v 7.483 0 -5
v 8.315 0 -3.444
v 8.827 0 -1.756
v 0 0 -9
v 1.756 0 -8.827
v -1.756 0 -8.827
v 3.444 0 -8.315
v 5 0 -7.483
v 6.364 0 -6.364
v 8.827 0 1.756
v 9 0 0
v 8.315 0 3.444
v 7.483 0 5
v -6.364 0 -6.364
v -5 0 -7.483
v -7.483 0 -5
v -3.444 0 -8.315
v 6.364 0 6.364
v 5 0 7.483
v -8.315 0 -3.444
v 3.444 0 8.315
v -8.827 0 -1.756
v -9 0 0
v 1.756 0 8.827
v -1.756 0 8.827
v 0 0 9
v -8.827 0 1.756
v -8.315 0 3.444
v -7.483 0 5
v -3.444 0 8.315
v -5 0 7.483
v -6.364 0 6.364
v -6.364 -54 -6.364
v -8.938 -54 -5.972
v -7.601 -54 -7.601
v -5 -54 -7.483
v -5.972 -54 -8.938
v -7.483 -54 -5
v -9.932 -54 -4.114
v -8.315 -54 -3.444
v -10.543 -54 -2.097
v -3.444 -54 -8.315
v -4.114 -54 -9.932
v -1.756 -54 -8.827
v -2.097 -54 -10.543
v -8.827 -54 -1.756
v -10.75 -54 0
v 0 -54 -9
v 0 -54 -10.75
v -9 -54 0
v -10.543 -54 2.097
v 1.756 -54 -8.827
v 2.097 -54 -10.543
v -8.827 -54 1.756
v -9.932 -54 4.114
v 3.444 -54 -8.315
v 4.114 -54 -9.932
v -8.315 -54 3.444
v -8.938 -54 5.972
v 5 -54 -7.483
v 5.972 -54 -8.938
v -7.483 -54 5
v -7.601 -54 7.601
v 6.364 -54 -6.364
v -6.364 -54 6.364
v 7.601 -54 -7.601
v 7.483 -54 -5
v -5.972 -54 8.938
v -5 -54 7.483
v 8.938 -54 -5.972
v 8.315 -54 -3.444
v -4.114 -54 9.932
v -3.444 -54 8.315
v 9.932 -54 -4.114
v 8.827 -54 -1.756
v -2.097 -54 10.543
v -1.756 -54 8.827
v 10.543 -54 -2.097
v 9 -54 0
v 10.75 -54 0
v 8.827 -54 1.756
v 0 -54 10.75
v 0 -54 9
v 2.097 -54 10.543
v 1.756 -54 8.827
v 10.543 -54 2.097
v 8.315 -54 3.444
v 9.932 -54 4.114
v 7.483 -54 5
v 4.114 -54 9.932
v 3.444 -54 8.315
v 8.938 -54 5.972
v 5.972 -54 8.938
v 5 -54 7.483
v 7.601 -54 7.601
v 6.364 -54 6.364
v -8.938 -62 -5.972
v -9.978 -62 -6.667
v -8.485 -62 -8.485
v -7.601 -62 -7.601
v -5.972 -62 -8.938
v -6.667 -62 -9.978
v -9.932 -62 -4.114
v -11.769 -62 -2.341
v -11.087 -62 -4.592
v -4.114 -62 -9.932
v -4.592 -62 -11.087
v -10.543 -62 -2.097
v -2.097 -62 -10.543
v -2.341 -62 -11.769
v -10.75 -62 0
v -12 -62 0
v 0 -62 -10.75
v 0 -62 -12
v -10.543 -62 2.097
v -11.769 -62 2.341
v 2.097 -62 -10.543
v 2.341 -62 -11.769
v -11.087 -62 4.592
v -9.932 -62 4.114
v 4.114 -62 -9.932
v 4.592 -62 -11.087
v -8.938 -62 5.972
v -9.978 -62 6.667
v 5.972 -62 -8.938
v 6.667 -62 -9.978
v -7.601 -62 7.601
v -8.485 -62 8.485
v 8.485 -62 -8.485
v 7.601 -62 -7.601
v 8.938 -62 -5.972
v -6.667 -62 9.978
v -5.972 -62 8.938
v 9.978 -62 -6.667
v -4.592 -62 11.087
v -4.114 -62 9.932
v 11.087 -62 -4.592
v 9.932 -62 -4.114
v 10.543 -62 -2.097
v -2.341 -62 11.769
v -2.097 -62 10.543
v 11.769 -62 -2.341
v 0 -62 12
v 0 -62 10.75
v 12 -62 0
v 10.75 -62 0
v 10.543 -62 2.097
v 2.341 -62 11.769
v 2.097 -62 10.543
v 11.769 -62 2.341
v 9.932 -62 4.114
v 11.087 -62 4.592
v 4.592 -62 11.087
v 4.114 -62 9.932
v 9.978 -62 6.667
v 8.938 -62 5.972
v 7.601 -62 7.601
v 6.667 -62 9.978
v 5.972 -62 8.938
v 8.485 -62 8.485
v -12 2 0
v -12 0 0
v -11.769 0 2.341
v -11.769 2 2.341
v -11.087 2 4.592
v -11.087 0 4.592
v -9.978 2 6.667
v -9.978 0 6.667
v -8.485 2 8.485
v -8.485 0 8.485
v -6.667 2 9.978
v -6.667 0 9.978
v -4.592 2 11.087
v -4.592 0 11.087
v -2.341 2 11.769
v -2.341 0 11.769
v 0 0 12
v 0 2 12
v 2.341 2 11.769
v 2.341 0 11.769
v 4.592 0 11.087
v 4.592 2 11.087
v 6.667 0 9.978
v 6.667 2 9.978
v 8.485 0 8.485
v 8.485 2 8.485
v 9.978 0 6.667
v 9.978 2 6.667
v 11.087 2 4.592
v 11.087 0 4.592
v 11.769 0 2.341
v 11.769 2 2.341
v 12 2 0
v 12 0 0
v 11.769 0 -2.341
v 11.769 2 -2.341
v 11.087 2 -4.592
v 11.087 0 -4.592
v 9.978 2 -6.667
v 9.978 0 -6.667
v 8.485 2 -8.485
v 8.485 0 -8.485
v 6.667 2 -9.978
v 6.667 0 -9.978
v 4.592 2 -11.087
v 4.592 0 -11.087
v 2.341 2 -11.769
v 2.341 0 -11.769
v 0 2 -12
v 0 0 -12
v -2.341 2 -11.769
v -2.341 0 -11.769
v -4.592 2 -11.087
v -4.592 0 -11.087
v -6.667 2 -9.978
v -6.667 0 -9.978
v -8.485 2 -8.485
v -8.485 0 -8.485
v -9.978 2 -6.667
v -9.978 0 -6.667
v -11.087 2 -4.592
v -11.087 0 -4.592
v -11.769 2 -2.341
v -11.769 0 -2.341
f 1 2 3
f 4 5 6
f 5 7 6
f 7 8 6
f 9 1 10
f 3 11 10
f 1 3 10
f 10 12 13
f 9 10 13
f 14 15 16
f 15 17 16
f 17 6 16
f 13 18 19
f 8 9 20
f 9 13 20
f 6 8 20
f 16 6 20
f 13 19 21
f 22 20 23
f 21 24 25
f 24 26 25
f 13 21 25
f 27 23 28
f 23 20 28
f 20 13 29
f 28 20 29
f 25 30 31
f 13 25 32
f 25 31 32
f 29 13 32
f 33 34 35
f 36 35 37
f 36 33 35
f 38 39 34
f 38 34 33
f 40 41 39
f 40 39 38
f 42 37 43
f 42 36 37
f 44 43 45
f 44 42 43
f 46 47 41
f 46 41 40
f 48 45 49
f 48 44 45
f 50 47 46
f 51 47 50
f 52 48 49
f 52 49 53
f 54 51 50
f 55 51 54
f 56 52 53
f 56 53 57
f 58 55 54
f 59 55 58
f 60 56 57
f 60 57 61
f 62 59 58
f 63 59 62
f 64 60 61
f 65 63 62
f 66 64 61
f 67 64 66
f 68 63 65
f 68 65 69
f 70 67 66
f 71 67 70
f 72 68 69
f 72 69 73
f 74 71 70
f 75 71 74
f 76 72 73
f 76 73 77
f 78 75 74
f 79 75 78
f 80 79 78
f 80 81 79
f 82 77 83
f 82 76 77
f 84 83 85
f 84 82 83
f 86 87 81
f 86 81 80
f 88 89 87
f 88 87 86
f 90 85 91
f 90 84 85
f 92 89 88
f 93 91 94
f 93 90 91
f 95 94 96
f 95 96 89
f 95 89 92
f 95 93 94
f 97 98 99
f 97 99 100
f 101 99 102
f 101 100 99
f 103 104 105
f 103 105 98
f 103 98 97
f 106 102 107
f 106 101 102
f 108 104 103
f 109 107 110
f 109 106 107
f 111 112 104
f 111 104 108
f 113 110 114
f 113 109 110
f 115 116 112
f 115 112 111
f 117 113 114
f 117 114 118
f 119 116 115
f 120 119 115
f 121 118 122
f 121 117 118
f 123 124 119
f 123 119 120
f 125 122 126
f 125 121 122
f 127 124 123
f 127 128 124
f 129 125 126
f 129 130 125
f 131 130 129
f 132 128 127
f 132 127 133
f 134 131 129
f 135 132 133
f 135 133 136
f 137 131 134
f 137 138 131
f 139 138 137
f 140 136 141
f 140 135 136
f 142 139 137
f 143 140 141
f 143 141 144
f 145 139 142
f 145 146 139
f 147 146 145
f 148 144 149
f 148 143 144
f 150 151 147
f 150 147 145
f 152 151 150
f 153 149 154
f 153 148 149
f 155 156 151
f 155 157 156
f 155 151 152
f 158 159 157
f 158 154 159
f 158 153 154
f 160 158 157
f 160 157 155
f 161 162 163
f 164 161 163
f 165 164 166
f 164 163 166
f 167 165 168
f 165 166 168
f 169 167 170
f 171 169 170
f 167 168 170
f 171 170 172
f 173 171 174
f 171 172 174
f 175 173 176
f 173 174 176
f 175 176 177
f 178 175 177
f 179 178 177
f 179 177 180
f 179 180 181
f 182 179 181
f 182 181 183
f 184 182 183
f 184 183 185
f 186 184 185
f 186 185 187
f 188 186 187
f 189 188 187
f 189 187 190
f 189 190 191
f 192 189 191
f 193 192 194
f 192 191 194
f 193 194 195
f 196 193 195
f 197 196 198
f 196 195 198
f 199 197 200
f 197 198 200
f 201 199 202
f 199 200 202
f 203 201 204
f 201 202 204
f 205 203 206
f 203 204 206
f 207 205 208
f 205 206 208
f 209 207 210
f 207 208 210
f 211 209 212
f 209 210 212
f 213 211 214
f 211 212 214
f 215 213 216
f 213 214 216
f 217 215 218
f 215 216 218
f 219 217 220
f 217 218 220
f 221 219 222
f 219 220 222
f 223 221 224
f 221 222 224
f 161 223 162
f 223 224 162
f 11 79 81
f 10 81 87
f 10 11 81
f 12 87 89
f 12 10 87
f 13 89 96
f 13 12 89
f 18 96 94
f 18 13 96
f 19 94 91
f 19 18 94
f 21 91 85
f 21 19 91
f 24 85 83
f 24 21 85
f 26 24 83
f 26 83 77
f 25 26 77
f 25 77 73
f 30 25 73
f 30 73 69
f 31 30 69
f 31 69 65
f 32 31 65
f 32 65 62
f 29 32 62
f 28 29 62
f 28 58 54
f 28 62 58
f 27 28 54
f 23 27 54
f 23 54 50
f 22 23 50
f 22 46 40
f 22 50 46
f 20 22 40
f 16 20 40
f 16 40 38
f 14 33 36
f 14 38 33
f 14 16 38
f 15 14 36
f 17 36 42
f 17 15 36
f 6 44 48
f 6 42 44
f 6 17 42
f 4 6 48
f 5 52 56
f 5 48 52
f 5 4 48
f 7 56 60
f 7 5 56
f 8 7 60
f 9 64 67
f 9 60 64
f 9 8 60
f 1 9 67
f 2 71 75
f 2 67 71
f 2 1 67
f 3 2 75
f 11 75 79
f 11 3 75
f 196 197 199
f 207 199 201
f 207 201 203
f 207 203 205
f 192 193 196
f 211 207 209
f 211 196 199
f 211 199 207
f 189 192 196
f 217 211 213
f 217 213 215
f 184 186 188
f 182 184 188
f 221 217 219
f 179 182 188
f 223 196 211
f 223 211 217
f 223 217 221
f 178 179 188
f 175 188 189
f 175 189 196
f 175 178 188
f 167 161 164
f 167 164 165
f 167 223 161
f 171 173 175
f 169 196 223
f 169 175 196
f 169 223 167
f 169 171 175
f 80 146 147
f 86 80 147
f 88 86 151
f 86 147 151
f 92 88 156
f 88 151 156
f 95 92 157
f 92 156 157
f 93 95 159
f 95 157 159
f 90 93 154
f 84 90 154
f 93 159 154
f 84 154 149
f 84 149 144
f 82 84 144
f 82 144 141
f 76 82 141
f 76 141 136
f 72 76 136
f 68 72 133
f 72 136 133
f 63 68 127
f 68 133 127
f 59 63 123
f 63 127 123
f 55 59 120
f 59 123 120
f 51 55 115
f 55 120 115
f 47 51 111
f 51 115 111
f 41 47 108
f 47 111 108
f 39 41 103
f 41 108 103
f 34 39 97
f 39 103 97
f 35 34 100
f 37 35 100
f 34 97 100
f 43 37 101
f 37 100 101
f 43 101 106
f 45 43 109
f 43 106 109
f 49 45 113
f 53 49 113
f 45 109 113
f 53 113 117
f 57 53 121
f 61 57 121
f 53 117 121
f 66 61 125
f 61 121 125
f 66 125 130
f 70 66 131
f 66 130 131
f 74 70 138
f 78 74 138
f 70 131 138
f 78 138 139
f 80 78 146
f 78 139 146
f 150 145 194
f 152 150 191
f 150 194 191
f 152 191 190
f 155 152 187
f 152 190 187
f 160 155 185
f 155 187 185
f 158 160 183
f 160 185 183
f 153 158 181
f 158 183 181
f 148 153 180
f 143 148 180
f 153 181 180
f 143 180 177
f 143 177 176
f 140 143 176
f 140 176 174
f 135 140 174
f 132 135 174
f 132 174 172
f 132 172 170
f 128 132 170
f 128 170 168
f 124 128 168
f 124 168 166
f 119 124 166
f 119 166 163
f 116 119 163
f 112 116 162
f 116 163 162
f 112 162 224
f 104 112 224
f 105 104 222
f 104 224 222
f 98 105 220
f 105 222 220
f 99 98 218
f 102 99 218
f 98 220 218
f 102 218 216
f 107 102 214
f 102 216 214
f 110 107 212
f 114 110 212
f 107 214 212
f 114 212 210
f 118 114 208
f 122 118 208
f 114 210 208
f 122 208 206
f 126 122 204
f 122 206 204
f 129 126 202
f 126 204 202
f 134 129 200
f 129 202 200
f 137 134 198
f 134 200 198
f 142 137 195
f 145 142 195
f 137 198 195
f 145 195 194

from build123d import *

# Parameters (mm, degrees)
F0_R     = 12
F0_R_2   = 9
F1_DEPTH = 62
F2_R     = 12
F3_DEPTH = 2
F4_R     = 10.75
F5_DEPTH = 8


with BuildPart() as f1:
    # F0 (on Front) → F1 (new body)
    with BuildSketch(Plane.XZ):
        Circle(F0_R)
        Circle(F0_R_2, mode=Mode.SUBTRACT)
    extrude(amount=F1_DEPTH)

    # F2 (on face) → F3 (join)
    with BuildSketch(Plane(origin=(0, 0, 0), x_dir=(-1, 0, 0), z_dir=(0, 1, 0))):
        Circle(F2_R)
    extrude(amount=F3_DEPTH)

    # F4 (on face) → F5 (cut)
    with BuildSketch(Plane.XZ.offset(62)):
        Circle(F4_R)
    extrude(amount=-F5_DEPTH, mode=Mode.SUBTRACT)


solid = f1.part
